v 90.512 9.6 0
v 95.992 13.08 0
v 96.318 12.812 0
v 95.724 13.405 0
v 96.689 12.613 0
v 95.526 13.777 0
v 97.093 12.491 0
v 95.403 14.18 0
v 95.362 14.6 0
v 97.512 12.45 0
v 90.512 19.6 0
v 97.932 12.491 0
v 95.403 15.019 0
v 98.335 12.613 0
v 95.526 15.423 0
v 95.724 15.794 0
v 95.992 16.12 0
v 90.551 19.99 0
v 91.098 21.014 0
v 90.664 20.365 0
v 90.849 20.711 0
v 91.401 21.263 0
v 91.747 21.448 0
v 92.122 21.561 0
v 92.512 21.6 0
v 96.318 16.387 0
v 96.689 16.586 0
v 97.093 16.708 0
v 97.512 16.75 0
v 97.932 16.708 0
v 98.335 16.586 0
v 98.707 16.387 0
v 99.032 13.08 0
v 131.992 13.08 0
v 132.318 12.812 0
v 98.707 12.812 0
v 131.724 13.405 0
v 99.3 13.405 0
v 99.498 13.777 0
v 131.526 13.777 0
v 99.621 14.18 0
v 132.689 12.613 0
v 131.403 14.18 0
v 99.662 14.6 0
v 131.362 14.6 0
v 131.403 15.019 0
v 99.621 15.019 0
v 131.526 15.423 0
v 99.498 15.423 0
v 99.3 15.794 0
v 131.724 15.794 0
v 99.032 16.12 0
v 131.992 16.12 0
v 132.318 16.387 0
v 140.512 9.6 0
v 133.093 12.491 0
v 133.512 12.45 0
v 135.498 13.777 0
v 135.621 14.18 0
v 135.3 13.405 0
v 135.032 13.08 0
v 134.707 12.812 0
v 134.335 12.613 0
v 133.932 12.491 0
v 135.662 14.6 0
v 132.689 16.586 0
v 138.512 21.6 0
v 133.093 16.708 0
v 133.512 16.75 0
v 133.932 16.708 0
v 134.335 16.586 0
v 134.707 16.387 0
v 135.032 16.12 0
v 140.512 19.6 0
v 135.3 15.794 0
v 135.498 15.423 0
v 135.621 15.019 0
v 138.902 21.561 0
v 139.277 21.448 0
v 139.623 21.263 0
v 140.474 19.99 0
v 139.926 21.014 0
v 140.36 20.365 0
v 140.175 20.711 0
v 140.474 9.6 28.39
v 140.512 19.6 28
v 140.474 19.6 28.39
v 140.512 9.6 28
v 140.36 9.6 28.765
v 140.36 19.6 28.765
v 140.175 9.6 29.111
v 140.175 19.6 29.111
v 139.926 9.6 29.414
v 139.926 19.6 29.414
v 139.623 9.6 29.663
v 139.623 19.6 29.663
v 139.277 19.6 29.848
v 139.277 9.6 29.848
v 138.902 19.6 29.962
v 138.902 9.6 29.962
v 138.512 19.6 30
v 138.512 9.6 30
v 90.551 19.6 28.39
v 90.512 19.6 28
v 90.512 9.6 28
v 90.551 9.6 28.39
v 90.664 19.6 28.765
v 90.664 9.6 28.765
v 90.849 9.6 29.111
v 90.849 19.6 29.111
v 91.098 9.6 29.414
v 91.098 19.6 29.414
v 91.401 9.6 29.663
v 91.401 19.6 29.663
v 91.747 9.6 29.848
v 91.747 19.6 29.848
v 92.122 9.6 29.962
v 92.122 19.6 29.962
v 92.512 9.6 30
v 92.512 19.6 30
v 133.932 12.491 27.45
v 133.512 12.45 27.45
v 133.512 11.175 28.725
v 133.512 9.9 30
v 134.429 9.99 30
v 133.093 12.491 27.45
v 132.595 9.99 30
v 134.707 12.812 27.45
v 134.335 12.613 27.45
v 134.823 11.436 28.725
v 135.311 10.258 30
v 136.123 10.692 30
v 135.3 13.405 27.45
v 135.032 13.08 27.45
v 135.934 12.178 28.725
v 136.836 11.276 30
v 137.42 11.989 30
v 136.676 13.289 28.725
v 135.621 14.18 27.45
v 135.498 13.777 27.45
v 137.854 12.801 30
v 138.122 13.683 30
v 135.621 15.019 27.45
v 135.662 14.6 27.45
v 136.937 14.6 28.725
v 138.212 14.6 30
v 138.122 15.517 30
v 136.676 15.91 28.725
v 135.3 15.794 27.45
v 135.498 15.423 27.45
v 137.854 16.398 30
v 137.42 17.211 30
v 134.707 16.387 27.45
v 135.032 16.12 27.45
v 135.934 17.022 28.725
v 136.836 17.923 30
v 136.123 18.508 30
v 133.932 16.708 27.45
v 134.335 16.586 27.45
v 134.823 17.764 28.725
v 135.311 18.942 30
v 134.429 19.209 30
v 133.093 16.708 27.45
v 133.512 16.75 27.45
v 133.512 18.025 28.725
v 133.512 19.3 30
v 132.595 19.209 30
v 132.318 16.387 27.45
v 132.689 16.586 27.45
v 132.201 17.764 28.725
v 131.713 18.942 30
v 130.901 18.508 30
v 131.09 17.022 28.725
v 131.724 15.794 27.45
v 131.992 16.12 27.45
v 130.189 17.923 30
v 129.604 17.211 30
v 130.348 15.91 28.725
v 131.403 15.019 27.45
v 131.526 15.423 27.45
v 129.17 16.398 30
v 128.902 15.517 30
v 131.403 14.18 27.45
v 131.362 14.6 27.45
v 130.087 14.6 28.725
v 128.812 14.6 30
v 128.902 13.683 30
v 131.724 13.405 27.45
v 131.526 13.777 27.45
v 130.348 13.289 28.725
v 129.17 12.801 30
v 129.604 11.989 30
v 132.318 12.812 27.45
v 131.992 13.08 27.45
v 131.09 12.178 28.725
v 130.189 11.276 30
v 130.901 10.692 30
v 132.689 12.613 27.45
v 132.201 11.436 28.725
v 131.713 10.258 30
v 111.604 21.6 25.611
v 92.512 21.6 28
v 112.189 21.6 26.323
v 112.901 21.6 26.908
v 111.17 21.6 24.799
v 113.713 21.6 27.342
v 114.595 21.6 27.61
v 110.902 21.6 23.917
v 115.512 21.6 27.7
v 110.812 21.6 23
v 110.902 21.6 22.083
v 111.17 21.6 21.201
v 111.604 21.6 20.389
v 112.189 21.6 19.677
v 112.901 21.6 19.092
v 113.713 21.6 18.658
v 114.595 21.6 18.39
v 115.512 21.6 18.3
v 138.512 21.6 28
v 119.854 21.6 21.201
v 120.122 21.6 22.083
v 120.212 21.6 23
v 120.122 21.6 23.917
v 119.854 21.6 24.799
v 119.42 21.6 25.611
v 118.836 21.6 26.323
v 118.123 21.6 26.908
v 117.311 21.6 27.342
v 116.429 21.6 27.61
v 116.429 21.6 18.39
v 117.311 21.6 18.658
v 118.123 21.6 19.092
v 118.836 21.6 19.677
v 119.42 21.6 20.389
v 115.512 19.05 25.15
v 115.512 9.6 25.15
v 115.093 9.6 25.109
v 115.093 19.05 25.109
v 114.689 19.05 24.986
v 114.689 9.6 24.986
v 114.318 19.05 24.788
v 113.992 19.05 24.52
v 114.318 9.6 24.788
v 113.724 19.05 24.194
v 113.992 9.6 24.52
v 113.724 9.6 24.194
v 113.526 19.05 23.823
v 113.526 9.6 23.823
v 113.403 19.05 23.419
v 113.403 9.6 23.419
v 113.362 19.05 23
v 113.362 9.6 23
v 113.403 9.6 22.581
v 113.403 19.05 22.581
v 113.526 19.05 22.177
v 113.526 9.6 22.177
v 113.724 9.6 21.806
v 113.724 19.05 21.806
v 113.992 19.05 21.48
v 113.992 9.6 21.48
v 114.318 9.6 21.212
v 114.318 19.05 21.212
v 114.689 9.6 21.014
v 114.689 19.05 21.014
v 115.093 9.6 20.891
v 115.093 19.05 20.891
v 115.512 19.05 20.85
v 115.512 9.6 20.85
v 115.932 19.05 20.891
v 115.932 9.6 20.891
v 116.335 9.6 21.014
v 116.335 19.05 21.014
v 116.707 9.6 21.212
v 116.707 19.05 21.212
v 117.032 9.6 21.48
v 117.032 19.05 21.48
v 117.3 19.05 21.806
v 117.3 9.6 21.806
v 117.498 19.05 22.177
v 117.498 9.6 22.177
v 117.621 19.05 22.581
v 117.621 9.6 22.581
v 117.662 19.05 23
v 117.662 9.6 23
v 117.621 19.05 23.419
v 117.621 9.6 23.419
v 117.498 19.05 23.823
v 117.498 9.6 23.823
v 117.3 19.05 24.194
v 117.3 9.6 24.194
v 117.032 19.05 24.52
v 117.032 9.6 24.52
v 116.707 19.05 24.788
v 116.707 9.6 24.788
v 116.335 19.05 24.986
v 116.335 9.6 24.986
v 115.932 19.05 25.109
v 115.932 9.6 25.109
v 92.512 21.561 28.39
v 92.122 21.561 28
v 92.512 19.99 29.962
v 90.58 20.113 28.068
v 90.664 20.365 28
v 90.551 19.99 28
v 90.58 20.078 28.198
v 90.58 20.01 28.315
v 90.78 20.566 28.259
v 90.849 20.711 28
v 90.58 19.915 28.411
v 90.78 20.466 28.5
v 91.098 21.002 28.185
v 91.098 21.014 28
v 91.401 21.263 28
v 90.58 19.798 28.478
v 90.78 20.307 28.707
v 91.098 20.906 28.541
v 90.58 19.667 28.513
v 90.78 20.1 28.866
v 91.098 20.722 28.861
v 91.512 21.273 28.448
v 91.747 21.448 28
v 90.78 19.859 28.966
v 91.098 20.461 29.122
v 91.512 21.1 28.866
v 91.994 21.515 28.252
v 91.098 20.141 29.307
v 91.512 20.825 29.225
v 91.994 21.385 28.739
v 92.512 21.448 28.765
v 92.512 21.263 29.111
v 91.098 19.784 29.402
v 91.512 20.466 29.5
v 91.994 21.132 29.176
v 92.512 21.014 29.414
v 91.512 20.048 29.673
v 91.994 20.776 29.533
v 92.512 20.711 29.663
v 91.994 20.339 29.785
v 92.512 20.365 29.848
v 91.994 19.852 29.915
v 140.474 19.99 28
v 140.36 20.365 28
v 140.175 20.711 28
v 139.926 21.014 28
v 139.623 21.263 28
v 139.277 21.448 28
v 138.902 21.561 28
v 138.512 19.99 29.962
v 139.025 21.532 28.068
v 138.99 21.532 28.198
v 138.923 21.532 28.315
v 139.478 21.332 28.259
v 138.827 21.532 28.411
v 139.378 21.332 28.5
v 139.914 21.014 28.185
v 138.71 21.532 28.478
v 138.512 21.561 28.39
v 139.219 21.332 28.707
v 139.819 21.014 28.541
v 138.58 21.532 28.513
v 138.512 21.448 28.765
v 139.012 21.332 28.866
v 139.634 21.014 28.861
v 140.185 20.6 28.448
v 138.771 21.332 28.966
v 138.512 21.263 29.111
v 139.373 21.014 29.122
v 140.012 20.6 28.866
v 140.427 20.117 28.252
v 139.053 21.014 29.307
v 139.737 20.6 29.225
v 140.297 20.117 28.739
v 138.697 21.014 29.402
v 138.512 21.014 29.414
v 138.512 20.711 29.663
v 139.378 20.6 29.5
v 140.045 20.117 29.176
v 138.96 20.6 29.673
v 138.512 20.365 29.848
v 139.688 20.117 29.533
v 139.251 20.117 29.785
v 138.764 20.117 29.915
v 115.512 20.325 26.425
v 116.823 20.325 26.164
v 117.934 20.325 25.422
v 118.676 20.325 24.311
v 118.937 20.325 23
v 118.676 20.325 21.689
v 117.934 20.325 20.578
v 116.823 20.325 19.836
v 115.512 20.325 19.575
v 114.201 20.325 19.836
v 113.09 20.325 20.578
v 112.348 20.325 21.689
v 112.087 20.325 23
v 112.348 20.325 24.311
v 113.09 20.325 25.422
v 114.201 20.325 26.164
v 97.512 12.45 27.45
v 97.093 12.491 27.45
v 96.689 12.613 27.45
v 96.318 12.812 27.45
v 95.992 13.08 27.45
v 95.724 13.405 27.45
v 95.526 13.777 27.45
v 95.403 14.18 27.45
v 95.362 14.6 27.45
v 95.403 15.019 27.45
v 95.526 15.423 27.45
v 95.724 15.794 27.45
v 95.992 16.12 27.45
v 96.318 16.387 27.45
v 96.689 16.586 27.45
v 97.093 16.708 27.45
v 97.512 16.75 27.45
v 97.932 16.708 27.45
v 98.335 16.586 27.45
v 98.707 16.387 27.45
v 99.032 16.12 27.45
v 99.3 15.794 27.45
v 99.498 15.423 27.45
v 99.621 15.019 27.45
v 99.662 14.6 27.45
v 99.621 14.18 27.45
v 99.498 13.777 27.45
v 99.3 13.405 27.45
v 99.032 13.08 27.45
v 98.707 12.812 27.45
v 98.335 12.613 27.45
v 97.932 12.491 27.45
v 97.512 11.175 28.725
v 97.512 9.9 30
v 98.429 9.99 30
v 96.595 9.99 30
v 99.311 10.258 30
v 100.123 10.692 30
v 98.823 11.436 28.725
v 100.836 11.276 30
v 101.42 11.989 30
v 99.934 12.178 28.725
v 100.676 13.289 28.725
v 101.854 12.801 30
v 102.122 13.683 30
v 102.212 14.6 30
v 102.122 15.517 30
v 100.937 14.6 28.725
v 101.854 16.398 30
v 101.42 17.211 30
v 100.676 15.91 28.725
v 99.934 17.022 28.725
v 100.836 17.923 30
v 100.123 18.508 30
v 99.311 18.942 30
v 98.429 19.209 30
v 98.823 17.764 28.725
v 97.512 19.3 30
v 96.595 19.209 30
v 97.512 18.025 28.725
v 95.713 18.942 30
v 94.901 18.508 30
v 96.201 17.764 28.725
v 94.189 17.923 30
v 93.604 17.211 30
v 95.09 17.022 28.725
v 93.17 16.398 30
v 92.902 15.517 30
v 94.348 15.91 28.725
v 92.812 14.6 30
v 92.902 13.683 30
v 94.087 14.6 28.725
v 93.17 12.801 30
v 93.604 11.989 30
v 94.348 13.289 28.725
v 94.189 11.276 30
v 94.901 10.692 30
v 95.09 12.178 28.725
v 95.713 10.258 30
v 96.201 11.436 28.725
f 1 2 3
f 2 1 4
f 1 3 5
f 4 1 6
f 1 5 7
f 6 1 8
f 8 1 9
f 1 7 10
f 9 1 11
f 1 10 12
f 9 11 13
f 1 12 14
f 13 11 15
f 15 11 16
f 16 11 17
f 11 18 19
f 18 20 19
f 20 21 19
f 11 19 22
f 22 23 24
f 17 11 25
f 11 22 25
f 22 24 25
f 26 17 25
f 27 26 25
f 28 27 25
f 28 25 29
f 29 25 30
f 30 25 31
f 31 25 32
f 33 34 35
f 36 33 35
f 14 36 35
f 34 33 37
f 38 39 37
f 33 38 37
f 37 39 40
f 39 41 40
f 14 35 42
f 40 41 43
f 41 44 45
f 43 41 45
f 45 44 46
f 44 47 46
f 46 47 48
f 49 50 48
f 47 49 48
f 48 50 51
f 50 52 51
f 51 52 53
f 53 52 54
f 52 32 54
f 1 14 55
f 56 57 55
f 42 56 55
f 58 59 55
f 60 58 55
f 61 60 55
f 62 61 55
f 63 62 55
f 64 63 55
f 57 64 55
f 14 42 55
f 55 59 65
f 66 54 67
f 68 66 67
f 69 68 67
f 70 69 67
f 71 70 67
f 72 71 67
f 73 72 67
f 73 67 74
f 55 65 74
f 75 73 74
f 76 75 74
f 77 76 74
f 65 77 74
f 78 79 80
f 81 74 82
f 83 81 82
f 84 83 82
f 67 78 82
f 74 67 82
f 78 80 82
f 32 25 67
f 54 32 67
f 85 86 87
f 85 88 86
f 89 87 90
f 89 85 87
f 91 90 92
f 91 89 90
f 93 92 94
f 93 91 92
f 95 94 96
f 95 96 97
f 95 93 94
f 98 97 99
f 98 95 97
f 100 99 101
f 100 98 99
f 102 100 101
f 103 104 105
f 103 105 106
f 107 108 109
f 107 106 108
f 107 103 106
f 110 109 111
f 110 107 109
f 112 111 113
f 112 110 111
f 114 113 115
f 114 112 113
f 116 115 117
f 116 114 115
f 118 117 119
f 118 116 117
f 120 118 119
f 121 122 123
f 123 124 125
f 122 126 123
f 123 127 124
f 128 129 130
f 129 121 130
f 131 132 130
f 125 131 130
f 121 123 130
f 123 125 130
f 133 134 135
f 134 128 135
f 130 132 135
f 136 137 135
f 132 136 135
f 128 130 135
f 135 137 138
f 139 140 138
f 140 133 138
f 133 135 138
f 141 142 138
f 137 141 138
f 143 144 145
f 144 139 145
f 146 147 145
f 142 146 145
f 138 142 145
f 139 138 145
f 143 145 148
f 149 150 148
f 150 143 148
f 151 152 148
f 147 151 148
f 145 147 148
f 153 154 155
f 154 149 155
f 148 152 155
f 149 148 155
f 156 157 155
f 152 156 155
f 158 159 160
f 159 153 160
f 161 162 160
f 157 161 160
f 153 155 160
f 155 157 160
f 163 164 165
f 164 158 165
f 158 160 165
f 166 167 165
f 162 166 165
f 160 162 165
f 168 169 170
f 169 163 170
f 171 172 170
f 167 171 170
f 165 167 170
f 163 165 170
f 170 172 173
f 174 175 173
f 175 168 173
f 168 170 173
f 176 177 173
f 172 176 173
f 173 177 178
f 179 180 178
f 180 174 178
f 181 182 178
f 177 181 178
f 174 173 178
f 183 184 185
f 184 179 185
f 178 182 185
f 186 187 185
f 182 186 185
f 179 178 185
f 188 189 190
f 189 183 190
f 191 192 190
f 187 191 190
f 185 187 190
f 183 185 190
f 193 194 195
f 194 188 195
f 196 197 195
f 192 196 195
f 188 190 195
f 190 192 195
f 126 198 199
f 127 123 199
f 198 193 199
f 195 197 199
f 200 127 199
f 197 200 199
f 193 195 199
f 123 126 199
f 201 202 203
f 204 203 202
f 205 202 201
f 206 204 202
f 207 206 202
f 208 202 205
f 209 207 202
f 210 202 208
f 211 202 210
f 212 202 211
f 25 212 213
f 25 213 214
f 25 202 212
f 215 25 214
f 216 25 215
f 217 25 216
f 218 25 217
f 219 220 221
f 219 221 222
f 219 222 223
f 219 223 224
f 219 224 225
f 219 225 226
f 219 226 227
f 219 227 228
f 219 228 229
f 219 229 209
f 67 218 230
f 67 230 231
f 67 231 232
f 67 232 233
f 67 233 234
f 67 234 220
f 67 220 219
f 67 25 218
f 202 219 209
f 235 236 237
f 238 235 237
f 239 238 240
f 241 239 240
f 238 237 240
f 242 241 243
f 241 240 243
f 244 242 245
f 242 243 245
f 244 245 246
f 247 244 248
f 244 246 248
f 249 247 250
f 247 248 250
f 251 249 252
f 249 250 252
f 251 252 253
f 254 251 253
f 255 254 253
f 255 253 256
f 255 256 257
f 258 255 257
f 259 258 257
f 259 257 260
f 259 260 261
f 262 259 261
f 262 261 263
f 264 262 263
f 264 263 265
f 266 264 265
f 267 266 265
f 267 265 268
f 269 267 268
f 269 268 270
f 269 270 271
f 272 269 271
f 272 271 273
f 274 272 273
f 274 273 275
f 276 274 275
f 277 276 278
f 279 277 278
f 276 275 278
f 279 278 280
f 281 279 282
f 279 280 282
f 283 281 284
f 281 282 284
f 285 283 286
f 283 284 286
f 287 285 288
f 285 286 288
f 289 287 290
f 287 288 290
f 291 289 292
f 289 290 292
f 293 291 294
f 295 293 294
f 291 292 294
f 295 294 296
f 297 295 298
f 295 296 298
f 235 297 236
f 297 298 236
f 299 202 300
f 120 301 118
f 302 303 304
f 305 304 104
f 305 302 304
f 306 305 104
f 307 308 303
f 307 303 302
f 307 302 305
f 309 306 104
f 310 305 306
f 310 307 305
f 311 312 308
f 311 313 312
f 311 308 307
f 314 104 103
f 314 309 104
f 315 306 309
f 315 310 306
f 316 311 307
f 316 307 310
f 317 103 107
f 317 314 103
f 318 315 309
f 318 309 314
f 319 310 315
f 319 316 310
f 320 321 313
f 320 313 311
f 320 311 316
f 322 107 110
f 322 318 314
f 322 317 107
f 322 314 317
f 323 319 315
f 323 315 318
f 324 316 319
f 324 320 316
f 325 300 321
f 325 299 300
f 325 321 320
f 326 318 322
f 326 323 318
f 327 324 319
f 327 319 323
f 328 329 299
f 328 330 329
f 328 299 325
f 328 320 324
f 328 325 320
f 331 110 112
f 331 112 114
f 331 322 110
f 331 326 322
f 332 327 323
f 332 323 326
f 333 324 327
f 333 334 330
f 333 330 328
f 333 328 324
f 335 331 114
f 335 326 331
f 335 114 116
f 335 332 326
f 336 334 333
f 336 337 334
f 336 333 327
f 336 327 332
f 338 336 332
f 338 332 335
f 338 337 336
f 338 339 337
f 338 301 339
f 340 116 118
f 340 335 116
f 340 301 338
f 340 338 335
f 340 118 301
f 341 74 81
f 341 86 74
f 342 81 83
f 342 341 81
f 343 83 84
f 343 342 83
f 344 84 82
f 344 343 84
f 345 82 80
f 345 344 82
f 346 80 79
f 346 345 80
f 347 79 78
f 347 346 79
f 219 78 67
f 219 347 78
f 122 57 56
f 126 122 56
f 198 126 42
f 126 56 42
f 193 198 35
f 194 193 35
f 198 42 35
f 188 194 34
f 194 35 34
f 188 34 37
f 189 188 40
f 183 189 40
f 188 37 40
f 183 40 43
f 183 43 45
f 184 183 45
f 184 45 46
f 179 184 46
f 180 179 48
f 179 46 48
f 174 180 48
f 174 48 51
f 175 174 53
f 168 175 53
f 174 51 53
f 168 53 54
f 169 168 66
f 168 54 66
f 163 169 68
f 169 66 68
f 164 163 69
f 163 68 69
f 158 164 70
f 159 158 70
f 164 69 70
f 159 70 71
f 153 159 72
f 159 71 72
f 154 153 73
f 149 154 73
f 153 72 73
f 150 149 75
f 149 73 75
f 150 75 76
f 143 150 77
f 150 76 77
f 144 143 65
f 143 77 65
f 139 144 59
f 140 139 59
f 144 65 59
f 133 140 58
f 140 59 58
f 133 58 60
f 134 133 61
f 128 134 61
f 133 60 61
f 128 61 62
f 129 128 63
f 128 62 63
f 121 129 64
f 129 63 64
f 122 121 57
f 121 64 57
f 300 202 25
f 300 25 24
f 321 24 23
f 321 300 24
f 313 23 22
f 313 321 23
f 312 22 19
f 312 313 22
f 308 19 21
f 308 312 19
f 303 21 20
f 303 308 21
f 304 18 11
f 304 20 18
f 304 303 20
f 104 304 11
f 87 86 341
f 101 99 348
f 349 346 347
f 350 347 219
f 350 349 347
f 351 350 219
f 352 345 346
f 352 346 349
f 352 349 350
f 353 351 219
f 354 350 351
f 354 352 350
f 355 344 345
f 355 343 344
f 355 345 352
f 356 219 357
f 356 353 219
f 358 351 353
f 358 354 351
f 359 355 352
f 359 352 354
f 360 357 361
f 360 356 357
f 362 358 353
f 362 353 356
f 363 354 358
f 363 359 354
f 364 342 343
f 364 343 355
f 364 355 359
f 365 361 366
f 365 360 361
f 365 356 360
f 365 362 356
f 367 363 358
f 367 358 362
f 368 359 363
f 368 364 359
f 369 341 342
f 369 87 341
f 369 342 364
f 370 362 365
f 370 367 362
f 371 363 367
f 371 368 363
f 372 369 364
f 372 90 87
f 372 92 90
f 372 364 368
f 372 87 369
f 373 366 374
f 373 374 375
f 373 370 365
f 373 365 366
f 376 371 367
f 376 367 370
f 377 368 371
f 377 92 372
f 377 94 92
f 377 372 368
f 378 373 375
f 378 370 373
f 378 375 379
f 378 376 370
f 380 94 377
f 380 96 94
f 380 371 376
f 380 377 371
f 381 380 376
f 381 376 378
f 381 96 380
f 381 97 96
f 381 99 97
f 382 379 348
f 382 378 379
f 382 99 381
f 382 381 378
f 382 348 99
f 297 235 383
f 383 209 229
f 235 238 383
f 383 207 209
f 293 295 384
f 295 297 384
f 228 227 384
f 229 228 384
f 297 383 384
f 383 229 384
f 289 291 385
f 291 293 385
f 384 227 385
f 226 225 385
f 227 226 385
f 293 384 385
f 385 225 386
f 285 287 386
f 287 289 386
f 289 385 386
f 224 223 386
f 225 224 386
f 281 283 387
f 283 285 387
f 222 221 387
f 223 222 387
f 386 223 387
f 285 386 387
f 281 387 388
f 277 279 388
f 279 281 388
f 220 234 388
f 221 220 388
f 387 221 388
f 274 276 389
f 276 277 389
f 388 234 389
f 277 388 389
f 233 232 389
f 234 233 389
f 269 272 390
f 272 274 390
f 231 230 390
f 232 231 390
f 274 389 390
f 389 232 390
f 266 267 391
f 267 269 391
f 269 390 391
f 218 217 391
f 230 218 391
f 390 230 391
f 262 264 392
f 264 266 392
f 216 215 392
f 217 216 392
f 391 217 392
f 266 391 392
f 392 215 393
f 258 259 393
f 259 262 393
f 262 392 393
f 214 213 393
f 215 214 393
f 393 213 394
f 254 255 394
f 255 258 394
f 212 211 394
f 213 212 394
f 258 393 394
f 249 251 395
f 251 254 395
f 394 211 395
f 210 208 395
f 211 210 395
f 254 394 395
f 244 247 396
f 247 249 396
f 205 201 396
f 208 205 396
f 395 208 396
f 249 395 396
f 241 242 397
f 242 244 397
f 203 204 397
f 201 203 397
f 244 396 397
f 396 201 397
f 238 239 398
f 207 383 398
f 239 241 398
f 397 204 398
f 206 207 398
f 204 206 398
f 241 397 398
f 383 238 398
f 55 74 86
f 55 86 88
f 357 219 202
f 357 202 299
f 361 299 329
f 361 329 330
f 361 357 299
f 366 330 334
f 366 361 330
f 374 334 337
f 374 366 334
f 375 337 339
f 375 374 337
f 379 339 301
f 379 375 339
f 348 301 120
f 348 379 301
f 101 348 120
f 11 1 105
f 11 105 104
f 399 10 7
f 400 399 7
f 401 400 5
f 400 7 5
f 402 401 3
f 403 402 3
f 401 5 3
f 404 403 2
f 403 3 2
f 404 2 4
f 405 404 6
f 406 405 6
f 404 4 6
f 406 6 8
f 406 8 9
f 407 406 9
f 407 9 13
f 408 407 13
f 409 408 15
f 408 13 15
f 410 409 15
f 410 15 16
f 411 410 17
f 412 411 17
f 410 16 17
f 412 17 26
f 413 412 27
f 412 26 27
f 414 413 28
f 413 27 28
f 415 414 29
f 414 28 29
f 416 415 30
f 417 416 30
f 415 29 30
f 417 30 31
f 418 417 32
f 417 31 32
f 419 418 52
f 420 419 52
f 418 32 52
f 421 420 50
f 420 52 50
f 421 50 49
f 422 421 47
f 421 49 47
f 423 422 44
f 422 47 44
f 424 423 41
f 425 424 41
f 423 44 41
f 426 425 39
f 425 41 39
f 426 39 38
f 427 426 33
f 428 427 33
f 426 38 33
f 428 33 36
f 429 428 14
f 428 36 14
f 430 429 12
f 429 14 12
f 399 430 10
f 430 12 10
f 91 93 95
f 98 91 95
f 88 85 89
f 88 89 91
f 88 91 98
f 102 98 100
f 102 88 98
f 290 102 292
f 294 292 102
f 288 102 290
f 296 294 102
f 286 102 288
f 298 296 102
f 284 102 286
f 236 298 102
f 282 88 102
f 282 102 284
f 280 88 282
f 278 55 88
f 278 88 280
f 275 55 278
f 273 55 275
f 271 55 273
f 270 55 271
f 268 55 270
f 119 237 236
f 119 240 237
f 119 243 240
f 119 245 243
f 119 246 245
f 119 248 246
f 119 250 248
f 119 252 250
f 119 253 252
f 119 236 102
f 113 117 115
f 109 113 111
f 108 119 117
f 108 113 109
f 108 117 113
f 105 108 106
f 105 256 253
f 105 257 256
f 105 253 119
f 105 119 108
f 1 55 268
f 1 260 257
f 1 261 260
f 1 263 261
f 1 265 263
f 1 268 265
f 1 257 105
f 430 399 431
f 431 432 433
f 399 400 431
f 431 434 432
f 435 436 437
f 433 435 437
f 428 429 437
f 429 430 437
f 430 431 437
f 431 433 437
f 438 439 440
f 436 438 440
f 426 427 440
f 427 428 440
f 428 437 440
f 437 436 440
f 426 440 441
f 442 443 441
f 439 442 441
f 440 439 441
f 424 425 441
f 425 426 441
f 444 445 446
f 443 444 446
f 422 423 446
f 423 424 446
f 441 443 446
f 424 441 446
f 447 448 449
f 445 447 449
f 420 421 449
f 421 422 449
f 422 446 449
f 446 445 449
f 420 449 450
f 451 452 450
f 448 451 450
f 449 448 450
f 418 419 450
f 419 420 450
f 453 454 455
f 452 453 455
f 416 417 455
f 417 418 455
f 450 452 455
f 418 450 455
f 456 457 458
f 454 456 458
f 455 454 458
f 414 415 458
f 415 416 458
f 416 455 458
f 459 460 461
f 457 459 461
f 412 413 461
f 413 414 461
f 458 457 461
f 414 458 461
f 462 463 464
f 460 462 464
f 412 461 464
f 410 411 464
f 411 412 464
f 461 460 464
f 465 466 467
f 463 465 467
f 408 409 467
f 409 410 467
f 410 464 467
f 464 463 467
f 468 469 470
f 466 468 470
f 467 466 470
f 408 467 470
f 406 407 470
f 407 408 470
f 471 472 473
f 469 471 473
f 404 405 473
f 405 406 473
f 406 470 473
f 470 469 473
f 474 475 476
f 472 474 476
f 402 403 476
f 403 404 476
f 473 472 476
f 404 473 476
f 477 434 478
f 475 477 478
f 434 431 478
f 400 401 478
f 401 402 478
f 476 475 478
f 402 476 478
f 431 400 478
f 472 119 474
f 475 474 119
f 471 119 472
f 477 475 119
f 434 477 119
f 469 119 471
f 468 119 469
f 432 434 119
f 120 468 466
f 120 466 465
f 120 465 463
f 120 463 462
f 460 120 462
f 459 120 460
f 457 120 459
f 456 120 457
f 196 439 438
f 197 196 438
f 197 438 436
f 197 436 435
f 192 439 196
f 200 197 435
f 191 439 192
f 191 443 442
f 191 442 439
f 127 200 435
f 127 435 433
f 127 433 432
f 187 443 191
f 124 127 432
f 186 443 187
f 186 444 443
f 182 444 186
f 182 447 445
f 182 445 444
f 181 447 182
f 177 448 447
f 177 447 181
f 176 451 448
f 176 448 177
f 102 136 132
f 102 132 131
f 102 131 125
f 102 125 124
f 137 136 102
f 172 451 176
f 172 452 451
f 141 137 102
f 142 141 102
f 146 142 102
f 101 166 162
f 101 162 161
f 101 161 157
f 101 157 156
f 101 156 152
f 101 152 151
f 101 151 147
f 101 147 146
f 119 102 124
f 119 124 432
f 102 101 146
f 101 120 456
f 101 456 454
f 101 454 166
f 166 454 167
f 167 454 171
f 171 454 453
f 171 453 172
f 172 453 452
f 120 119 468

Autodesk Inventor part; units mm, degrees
ref_plane "YZ Plane" through (0, 0, 0) normal (1, 0, 0) x (0, 1, 0)
ref_plane "XZ Plane" through (0, 0, 0) normal (0, 1, 0) x (-1, 0, 0)
ref_plane "XY Plane" through (0, 0, 0) normal (0, 0, 1) x (1, 0, 0)
sketch "Skizze1" plane through (0, 0, 0) normal (0, 0, 1) x (1, 0, 0)
  line L0 (140.5121, 9.5998) -> (90.5121, 9.5998)
  line L1 (90.5121, 9.5998) -> (90.5121, 21.5998)
  line L2 (90.5121, 21.5998) -> (140.5121, 21.5998)
  line L3 (140.5121, 21.5998) -> (140.5121, 9.5998)
  point P0 (0, 0)
  dimension "d0" = 50
  dimension "d1" = 12
extrude "Extrusion1" add sketch "Skizze1" along normal blind 30
sketch "Skizze2" plane through (0, 0, 30) normal (0, 0, 1) x (1, 0, 0)
  line L0 (140.5121, 9.5998) -> (140.5121, 21.5998) projected
  line L1 (140.5121, 14.5998) -> (133.5121, 14.5998)
  line L2 (133.5121, 14.5998) -> (97.5121, 14.5998)
  line L3 (97.5121, 14.5998) -> (90.5121, 14.5998)
  line L4 (90.5121, 21.5998) -> (90.5121, 9.5998) projected
  line L5 (140.5121, 21.5998) -> (90.5121, 21.5998) projected
  point P0 (0, 0)
  dimension "d4" = 7
  dimension "d12" = 7
hole "Bohrung1" at (133.5121, 14.5998, 30) at (97.5121, 14.5998, 30) direction (0, 0, -1) diameter 4.3 end through all countersink diameter 9.4 countersink angle 90 clearance for "Flachkopfmaschinenschraube" size "M4" standard "ANSI Metrisches M Profil"
sketch "Skizze4" plane through (90.5121, 21.5998, 0) normal (0, 1, 0) x (1, 0, 0)
  line L0 (25, -23) -> (25, -30)
  line L1 (50, -30) -> (0, -30) projected
  point P0 (-90.5121, 0)
  dimension "d37" = 7
hole "Bohrung5" at (115.5121, 21.5998, 23) direction (0, -1, 0) diameter 4.3 end through all countersink diameter 9.4 countersink angle 90 clearance for "Flachkopfmaschinenschraube" size "M4" standard "ANSI Metrisches M Profil"
fillet "Rundung3" radius 2 5 edges at (140.5121, 15.5998, 30) (140.5121, 21.5998, 15) (115.5121, 21.5998, 30) (90.5121, 21.5998, 15) (90.5121, 15.5998, 30)
properties part number "HebelhalterBlock" material "Aluminium 6061(1)"
